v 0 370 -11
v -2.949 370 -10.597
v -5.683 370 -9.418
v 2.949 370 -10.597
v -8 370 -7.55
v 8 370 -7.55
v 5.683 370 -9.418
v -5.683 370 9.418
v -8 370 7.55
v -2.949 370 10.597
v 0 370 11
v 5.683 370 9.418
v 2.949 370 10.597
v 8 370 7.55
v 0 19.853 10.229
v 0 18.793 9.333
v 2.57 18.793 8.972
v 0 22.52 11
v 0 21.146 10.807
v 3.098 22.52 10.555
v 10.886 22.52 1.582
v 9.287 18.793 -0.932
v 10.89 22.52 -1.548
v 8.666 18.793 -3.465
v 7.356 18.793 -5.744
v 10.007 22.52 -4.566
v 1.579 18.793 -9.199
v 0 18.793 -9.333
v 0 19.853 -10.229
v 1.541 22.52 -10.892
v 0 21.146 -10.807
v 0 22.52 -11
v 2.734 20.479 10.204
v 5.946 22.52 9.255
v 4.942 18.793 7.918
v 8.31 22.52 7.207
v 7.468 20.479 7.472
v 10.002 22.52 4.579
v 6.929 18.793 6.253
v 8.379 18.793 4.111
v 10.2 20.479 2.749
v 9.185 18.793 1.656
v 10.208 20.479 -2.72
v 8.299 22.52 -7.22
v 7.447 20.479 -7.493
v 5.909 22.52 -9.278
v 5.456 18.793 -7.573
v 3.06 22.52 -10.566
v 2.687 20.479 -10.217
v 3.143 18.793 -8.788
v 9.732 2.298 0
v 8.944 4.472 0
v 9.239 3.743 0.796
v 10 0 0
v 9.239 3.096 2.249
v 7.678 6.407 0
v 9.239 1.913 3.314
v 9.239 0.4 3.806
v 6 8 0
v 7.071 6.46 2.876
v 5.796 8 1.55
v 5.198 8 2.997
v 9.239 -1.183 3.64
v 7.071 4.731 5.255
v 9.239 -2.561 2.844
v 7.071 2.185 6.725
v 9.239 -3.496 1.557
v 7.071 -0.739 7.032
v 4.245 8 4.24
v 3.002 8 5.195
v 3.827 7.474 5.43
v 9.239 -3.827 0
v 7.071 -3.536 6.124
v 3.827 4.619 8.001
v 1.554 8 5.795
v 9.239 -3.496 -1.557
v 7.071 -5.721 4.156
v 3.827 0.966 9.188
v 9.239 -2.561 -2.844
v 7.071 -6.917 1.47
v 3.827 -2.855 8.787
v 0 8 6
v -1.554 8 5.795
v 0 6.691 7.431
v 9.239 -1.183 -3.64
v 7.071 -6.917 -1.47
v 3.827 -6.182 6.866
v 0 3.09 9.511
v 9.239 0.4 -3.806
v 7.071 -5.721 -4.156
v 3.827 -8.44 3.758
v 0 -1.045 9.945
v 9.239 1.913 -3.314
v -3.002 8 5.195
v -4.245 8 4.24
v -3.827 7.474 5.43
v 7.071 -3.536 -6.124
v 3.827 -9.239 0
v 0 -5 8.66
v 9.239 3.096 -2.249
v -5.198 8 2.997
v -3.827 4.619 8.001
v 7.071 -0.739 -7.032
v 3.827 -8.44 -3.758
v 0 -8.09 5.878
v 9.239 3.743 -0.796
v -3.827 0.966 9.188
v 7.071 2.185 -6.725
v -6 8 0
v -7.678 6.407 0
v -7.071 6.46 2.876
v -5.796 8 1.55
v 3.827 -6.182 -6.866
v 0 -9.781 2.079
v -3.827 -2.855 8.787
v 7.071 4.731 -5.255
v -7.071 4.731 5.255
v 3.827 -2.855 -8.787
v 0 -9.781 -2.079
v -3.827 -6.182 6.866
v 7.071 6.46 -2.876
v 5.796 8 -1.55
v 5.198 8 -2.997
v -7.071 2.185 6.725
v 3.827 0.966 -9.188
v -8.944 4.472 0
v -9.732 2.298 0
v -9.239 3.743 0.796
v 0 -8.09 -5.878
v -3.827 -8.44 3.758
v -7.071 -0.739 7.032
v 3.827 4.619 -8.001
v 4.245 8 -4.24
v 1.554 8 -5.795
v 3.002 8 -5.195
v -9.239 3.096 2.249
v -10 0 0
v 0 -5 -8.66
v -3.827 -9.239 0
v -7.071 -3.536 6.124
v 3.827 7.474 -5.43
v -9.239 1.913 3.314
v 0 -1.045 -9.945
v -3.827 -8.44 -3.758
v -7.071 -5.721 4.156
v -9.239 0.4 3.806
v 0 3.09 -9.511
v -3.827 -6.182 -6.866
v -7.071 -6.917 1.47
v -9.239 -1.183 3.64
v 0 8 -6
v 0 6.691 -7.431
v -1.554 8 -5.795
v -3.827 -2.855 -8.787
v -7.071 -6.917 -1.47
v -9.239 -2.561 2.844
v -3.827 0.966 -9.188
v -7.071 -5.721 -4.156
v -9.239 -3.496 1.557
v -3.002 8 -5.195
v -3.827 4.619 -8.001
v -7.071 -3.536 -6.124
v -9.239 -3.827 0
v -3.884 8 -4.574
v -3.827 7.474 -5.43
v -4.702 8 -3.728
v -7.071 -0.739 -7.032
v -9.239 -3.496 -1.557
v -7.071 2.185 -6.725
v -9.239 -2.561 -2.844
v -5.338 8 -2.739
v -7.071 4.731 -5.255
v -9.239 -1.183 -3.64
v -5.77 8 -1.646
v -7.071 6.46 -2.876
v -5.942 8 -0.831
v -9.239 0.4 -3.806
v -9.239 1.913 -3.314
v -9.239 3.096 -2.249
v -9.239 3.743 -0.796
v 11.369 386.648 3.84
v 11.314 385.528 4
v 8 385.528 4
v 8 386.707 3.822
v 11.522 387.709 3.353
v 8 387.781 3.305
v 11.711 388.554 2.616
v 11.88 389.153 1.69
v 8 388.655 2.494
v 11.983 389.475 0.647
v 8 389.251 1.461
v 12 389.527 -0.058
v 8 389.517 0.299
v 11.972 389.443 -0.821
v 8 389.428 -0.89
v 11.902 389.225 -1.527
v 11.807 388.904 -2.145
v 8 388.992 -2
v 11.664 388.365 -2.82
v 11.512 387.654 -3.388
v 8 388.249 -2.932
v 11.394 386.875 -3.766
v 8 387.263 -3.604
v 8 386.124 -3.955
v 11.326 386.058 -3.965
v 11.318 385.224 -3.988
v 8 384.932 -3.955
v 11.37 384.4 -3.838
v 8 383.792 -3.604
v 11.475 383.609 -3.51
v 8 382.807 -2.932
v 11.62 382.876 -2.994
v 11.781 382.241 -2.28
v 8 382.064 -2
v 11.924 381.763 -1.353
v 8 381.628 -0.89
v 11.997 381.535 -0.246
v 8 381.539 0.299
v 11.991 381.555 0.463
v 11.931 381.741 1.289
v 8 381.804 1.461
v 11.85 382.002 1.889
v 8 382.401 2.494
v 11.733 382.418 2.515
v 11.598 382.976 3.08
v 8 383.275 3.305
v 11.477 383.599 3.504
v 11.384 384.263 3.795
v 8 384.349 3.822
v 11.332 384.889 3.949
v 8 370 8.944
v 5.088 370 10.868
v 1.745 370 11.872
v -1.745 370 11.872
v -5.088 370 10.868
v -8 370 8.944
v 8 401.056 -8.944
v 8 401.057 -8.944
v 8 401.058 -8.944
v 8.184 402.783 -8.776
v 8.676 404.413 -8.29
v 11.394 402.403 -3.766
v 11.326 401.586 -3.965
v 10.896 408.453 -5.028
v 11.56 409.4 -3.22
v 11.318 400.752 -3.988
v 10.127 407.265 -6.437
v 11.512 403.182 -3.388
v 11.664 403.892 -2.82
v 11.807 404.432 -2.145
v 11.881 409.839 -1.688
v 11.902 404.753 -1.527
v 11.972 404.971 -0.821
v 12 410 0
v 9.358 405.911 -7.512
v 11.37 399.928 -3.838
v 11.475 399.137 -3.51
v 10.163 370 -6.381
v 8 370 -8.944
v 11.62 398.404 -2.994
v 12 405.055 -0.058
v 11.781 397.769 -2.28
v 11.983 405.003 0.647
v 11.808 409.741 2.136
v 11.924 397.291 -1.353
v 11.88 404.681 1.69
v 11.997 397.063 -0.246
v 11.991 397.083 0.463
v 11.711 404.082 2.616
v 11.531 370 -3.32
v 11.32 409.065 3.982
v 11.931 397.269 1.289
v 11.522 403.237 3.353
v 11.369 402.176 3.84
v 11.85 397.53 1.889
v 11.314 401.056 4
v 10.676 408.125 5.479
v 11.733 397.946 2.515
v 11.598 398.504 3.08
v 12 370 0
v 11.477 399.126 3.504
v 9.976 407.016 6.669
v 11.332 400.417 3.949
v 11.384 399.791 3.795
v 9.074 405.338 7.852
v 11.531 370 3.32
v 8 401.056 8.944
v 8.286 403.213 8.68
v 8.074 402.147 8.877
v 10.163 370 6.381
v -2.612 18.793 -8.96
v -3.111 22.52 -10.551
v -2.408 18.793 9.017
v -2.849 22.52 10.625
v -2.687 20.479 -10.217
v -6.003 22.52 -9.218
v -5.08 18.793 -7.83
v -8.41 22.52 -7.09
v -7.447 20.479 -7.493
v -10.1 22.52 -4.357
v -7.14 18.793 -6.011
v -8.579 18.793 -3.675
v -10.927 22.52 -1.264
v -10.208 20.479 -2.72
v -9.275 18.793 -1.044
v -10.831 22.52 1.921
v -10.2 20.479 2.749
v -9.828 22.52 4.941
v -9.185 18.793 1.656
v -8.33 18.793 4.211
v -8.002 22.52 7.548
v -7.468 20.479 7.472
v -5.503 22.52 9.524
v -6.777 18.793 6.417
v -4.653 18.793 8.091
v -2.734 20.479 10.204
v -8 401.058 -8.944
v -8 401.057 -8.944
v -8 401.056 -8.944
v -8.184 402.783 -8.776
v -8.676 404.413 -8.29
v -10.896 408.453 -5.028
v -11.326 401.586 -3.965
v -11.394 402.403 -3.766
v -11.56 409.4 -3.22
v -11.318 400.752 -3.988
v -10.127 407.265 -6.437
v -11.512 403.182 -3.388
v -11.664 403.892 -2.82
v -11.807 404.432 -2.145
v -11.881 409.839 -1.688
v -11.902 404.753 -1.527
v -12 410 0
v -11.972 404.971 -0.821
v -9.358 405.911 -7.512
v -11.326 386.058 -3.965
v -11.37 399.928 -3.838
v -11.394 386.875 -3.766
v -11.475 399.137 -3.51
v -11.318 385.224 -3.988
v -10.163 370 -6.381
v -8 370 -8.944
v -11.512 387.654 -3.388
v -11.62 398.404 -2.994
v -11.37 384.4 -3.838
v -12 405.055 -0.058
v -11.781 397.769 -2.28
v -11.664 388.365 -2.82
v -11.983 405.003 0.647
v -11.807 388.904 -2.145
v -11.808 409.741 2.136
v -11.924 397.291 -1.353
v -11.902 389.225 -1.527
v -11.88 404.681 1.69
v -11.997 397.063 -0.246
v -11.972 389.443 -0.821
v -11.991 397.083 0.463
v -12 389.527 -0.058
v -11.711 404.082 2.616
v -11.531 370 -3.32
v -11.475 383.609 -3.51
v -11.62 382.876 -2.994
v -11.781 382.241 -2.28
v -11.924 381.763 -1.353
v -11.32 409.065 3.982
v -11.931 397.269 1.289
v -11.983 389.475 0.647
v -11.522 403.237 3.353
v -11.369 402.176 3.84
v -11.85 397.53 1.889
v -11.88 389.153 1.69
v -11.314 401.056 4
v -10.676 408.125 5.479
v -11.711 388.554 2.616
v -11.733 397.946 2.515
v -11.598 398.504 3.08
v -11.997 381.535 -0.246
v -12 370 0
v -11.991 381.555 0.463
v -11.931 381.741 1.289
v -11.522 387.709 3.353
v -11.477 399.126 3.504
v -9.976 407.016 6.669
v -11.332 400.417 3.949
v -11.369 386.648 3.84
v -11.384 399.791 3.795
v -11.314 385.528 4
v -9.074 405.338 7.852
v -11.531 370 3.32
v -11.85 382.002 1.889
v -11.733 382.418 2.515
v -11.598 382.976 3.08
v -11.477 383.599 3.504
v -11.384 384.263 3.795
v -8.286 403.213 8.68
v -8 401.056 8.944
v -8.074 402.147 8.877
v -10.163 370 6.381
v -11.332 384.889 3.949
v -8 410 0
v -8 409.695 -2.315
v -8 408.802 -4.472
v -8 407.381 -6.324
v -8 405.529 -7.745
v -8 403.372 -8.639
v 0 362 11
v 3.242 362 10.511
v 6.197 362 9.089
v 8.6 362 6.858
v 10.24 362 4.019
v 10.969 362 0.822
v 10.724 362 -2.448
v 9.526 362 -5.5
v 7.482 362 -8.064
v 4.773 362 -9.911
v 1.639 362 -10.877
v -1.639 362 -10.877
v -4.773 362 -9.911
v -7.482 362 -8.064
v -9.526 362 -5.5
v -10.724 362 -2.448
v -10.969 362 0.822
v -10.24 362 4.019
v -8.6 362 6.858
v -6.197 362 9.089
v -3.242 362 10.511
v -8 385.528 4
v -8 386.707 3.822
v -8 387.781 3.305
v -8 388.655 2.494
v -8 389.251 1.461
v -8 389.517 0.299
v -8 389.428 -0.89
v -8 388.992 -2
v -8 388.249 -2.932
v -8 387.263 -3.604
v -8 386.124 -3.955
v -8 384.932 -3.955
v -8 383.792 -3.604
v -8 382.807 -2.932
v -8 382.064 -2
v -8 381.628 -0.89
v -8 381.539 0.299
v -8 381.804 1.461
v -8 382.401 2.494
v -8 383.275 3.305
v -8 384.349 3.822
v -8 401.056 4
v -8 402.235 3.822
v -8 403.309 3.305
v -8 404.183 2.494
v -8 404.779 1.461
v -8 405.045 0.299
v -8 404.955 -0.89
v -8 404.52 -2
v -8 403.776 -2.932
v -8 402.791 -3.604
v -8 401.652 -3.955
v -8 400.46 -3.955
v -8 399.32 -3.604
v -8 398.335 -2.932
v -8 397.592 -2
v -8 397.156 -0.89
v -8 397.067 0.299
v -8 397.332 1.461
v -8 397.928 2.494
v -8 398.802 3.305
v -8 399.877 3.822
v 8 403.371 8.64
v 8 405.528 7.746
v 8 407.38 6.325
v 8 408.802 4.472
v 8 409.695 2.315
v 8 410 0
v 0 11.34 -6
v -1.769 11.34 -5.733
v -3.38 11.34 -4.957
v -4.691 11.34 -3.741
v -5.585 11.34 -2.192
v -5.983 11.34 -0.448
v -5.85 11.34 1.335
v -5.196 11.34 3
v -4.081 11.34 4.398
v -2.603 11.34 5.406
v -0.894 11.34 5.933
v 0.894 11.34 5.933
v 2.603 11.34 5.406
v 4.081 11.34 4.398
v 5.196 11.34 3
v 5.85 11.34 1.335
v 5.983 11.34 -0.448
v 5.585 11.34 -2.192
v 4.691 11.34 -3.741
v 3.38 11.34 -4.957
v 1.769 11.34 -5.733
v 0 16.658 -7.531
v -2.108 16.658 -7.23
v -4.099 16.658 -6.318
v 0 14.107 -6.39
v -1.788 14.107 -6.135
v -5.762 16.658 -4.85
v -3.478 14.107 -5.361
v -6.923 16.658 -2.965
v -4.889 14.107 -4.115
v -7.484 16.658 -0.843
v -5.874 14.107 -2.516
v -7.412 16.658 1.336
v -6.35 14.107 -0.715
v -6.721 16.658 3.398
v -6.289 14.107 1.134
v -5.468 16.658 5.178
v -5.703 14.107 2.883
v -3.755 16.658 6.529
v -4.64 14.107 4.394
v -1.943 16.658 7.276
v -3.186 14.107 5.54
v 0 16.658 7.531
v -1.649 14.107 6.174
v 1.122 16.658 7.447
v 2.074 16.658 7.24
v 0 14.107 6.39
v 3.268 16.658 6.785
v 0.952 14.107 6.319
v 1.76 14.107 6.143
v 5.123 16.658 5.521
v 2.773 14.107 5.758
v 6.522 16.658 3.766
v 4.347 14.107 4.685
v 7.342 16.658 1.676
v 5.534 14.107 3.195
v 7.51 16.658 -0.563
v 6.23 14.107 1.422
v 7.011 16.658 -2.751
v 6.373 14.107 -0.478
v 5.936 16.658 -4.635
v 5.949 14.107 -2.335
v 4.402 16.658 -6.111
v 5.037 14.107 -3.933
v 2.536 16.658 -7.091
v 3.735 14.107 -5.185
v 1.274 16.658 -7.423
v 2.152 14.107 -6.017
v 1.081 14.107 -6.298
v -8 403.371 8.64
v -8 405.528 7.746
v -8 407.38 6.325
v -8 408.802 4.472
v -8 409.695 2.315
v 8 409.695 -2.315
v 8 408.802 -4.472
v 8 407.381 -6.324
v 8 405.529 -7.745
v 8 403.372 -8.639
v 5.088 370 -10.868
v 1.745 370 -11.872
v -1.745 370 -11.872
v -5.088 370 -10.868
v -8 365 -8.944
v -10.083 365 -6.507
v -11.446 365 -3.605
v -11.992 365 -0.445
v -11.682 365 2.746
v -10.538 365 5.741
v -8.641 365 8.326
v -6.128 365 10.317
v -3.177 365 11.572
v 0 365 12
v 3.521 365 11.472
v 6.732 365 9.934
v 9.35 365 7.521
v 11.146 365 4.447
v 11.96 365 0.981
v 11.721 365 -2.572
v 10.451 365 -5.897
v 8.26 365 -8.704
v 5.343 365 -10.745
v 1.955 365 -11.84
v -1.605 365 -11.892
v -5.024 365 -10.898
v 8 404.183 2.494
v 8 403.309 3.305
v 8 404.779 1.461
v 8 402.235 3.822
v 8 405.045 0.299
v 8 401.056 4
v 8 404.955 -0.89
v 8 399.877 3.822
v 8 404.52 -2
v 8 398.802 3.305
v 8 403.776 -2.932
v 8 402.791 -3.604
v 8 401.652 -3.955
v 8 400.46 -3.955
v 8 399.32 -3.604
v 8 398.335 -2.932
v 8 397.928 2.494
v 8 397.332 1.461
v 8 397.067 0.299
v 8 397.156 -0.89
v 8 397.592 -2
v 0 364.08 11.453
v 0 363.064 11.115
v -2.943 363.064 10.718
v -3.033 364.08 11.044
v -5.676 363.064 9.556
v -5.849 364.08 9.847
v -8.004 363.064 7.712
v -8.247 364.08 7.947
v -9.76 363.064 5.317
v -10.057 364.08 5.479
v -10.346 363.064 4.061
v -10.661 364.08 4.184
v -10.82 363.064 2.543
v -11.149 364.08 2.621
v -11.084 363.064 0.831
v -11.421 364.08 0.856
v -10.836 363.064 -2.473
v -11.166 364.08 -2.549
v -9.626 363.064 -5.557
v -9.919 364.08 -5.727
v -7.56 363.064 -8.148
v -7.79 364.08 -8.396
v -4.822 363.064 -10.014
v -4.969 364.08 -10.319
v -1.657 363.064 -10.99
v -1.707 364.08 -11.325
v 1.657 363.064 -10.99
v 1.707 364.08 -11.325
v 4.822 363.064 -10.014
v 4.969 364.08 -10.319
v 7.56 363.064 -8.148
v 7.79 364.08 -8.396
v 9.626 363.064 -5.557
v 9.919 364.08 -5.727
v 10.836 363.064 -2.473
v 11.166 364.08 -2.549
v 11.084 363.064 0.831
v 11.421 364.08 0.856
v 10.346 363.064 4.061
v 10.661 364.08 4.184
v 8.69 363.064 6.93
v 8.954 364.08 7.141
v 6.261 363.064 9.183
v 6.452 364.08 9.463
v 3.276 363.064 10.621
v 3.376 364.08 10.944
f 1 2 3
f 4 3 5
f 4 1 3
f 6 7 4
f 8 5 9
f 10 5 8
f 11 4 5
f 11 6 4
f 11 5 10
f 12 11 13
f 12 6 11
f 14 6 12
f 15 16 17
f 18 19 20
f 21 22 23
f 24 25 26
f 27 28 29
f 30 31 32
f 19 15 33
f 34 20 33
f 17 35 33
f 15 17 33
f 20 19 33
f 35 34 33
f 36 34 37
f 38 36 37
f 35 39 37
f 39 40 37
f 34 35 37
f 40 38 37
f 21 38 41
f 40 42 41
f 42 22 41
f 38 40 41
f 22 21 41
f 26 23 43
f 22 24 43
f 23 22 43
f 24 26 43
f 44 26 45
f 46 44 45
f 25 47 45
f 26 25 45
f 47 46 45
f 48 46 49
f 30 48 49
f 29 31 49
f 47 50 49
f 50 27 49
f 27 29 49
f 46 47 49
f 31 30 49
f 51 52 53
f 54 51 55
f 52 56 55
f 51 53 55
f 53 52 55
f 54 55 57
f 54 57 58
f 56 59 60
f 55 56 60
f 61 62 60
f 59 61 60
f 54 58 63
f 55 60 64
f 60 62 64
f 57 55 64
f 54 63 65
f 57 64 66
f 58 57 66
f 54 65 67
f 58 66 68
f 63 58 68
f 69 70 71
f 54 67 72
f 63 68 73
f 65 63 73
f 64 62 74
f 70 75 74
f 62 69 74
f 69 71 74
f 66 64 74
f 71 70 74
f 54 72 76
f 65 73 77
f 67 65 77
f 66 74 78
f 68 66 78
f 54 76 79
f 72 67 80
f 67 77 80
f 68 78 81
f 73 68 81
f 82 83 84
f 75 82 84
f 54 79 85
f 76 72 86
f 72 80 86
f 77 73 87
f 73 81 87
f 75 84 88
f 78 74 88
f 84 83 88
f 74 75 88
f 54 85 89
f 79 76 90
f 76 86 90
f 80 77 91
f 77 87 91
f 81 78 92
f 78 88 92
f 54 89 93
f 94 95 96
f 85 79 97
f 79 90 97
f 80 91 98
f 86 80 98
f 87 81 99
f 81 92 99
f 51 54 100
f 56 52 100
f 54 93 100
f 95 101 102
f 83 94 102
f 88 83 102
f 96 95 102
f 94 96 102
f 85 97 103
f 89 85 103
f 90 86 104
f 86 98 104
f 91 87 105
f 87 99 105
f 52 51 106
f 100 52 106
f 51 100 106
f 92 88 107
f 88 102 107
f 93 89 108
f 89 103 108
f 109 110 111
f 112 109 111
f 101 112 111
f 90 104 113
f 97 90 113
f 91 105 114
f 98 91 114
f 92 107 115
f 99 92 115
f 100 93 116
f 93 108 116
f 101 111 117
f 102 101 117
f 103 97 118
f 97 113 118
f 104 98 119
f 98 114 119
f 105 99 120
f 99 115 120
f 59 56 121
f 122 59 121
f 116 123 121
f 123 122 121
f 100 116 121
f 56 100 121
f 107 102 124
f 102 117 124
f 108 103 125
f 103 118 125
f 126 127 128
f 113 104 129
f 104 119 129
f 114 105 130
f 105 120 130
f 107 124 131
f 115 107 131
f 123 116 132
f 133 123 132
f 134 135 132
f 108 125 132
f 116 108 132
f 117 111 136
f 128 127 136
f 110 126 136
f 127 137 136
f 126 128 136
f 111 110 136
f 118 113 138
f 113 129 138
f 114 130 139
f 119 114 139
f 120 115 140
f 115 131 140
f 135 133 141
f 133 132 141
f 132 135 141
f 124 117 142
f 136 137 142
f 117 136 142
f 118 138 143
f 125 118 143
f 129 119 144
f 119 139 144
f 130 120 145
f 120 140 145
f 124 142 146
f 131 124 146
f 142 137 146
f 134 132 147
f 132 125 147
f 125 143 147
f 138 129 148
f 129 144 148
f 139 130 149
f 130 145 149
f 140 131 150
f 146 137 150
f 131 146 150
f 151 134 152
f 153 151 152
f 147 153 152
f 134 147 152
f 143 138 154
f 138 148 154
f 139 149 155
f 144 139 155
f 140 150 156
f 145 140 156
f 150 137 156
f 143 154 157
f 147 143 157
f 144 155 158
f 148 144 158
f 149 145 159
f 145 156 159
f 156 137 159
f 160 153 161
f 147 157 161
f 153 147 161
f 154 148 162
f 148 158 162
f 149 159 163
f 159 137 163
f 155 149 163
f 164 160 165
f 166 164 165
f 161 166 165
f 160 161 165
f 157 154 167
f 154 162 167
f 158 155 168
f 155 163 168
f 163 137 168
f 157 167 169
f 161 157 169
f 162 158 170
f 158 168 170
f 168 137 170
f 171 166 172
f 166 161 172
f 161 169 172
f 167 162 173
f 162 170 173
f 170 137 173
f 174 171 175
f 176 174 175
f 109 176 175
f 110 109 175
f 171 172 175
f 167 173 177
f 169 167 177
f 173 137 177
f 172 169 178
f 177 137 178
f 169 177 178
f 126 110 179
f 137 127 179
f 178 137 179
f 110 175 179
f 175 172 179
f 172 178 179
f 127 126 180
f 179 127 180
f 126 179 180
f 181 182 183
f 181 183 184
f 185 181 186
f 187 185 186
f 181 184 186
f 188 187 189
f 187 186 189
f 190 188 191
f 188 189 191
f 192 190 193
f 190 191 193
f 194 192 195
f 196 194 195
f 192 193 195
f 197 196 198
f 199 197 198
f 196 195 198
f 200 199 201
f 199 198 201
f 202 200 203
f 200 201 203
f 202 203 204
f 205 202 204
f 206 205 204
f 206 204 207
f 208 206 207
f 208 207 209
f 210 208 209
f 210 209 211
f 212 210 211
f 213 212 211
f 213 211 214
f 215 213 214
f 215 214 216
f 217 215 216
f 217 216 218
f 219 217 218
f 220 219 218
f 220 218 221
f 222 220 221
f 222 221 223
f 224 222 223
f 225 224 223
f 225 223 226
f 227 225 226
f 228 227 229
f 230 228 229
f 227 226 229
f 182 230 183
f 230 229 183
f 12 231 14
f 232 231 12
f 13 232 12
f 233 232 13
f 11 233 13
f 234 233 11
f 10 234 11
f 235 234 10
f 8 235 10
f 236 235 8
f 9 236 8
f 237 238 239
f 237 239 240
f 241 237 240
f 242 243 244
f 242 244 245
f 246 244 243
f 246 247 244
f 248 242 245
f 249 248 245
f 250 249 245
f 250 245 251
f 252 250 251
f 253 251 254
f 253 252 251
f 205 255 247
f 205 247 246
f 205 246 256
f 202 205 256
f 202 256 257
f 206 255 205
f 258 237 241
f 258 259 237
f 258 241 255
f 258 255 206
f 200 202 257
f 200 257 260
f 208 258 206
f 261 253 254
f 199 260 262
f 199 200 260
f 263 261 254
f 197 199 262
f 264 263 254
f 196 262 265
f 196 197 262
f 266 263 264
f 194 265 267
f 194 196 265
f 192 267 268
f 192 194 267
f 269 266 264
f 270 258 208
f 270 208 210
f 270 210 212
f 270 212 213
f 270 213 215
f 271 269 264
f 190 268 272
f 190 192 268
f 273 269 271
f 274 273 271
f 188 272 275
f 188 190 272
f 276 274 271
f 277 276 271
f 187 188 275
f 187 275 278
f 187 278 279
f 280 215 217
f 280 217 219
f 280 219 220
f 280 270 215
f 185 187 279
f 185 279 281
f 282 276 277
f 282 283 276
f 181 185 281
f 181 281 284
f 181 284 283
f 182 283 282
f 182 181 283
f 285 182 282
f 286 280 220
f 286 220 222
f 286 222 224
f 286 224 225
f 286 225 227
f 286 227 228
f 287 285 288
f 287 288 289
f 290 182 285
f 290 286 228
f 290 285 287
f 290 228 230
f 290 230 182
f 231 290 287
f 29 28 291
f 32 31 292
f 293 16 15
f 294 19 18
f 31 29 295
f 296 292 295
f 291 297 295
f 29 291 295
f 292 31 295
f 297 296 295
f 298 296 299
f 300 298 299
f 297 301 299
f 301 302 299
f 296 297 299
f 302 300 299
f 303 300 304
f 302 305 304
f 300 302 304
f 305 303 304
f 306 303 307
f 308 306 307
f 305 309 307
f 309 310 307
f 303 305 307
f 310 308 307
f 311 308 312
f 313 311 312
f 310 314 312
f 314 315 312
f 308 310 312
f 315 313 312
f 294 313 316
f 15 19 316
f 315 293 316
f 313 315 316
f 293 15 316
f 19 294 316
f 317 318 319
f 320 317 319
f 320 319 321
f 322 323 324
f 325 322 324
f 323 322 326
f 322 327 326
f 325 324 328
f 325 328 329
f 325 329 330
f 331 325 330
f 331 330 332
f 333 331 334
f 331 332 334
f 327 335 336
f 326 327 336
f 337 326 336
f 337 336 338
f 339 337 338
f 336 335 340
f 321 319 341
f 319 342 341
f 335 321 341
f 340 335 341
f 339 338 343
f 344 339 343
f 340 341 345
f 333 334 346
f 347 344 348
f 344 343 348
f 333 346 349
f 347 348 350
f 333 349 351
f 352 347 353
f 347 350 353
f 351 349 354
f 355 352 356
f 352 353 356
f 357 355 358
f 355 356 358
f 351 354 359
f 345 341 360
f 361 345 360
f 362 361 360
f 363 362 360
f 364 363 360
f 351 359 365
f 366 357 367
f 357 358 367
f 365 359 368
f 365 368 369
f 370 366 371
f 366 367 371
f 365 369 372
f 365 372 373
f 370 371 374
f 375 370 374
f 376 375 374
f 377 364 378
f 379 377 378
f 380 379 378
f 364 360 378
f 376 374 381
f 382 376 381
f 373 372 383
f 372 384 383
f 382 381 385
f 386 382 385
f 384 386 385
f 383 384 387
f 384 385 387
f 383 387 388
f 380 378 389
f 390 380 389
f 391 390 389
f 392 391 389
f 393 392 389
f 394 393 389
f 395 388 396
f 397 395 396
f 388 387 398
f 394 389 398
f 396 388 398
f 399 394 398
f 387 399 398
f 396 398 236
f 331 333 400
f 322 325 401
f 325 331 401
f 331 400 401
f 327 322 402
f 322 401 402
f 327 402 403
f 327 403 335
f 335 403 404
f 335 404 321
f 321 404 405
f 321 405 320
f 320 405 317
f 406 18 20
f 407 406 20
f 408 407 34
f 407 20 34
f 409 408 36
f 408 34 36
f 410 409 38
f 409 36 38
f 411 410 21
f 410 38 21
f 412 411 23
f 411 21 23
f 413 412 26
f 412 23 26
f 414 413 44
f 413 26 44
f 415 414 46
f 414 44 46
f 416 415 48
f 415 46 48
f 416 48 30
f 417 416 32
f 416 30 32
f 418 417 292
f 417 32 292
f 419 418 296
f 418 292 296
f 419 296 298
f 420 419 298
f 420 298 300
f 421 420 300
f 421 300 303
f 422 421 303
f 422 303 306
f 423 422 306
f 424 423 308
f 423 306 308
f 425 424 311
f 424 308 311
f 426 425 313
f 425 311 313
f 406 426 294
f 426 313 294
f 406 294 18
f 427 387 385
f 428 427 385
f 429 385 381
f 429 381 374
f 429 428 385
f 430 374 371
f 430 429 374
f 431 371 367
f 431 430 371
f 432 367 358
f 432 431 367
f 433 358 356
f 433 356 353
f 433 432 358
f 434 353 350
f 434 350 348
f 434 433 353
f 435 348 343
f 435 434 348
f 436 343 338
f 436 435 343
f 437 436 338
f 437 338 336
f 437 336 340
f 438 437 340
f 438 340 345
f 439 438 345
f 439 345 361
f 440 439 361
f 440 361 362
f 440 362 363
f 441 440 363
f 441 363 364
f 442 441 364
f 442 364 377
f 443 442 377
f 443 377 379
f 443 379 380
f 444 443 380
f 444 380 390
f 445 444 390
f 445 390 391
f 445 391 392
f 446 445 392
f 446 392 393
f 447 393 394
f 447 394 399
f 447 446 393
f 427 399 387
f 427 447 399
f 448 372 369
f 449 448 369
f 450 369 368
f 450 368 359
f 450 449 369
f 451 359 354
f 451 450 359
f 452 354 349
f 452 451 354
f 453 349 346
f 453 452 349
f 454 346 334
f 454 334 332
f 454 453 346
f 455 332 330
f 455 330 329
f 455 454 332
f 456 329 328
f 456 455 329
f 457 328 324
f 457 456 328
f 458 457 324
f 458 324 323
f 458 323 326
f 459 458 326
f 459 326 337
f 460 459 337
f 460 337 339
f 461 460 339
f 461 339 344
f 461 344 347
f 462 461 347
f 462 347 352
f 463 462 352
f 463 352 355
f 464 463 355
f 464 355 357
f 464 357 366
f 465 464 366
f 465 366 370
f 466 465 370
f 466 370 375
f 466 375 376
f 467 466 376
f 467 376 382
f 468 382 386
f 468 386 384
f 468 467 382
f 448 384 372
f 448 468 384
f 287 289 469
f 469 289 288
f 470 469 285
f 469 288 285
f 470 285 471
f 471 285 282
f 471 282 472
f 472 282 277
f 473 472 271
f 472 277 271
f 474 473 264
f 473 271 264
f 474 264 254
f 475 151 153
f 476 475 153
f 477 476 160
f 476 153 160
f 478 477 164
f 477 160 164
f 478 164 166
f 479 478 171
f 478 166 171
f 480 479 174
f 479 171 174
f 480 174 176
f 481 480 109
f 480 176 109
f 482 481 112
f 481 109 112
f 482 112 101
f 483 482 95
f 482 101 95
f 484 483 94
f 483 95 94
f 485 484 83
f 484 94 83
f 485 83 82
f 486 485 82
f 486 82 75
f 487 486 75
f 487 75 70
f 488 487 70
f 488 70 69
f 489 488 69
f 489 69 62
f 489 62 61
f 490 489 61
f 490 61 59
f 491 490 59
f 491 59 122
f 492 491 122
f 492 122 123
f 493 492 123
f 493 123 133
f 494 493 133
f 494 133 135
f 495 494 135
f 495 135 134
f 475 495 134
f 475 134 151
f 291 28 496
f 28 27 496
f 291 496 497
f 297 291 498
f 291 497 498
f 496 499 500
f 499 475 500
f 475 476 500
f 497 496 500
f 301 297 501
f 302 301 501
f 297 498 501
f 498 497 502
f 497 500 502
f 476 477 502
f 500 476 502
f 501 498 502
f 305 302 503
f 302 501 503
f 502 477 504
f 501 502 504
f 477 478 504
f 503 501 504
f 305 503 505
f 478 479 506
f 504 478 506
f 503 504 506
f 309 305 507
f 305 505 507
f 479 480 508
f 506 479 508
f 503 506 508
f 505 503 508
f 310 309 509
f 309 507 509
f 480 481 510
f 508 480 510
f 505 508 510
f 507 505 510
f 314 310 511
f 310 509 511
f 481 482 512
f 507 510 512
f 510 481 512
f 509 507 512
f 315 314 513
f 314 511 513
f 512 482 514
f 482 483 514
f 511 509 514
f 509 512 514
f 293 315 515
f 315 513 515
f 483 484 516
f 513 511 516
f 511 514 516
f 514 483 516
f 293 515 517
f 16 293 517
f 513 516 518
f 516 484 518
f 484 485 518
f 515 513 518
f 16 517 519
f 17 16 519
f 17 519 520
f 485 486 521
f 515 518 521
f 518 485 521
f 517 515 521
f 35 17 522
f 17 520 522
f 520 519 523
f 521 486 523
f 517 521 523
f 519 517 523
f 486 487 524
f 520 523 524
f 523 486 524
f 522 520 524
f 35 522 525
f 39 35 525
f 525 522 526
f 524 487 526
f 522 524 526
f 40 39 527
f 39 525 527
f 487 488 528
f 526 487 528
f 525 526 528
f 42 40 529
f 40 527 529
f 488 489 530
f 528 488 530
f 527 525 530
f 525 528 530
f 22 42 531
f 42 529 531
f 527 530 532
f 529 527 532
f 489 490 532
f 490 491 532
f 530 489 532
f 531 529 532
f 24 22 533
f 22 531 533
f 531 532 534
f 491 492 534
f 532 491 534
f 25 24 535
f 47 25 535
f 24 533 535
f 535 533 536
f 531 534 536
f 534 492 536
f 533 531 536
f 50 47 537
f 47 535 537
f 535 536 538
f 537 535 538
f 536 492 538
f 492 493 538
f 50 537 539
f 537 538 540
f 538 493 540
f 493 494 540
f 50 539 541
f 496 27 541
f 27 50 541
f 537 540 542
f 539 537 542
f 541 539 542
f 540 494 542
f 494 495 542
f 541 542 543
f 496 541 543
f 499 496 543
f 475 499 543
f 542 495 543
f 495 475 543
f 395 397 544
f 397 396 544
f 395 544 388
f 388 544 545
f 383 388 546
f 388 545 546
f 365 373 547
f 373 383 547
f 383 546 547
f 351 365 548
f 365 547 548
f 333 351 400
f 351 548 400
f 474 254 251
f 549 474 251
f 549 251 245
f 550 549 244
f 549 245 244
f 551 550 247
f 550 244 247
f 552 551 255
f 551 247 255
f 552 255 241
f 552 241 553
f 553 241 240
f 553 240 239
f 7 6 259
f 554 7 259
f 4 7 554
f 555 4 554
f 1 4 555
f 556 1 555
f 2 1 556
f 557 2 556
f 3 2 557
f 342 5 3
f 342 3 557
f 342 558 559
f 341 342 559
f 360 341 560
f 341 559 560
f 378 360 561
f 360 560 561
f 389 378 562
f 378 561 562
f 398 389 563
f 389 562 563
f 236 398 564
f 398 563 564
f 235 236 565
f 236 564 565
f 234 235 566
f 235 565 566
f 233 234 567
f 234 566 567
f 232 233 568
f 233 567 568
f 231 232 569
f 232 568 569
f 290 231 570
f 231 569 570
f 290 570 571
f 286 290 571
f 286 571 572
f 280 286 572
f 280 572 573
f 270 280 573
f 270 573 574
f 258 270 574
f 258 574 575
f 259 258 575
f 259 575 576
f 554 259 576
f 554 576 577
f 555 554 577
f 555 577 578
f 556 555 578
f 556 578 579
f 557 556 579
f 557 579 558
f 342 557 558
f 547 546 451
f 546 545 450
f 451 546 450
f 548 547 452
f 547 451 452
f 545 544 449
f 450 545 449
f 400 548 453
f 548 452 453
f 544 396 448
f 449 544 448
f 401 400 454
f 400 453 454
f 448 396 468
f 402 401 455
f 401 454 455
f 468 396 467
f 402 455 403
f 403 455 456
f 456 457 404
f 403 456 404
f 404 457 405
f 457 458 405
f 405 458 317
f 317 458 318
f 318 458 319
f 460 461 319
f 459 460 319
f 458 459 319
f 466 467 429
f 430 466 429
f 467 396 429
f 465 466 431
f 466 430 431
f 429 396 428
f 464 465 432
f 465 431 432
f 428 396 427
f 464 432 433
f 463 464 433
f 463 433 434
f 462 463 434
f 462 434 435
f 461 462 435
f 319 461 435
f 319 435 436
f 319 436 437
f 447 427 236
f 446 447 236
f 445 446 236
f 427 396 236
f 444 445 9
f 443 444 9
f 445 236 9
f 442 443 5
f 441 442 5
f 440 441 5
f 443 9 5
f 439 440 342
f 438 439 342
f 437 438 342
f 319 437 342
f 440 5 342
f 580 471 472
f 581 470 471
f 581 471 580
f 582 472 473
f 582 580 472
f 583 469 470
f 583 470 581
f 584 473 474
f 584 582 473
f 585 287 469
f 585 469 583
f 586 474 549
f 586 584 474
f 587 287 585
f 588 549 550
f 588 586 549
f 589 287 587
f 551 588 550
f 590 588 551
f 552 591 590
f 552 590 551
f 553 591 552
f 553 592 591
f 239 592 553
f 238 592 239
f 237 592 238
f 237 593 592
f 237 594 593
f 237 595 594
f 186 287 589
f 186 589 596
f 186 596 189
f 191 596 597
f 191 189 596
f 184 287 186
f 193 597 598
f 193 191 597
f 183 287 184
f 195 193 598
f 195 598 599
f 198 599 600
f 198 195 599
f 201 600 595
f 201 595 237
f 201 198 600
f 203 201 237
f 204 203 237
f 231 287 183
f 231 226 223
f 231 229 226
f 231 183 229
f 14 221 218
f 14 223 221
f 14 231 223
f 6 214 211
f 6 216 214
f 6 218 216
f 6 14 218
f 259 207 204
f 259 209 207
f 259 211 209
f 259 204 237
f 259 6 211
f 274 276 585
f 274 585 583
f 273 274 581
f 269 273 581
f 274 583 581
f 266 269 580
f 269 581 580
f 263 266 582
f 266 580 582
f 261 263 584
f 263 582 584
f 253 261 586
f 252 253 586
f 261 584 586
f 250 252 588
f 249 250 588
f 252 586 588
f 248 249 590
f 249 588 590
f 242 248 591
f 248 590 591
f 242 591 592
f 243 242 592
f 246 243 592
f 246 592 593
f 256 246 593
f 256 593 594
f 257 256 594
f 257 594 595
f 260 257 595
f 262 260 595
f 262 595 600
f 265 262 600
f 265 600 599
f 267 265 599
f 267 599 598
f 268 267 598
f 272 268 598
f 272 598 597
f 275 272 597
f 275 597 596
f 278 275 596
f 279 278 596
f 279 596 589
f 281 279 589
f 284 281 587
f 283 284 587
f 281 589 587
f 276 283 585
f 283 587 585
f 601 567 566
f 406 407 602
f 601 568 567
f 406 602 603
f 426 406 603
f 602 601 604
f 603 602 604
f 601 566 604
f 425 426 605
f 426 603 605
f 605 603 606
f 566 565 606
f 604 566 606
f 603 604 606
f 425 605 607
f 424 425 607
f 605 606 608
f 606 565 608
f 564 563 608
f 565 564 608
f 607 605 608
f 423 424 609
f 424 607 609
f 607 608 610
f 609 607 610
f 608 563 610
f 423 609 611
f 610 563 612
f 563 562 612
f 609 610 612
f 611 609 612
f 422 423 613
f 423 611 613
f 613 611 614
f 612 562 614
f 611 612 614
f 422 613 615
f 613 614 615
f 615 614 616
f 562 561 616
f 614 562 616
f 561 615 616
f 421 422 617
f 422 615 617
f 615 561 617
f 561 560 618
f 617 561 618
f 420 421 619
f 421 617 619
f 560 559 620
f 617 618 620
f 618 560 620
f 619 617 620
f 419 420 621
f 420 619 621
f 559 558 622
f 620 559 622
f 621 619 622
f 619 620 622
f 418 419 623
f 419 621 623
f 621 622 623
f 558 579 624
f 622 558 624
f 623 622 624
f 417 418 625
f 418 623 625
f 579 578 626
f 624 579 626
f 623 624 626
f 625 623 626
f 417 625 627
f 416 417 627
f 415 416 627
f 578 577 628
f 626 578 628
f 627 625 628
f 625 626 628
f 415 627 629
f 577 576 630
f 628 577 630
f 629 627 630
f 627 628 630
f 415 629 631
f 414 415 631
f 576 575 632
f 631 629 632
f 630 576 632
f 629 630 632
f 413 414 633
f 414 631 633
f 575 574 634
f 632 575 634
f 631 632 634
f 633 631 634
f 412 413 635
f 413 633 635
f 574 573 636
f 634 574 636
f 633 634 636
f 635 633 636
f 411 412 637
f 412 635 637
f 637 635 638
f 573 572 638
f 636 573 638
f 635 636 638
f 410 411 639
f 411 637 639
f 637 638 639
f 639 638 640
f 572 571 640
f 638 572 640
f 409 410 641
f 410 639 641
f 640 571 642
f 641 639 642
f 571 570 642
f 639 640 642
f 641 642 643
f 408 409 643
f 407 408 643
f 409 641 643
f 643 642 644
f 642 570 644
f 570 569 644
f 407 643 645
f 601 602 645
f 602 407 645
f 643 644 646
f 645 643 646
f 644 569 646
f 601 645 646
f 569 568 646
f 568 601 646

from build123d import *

# Parameters (mm, degrees)
ESBO_O2_R                         = 6
RESSALTO_EXTRUS_O1_DEPTH          = 20
ESBO_O3_R                         = 11
RESSALTO_EXTRUS_O2_DEPTH          = 350
FILETE1_R                         = 10
FILETE2_R                         = 5
RESSALTO_EXTRUS_O3_DEPTH          = 40
RESSALTO_EXTRUS_O4_START          = -5
ESBO_O7_R                         = 12
RESSALTO_EXTRUS_O4_DEPTH          = 5
FILETE3_R                         = 5
CORTE_EXTRUS_O1_DEPTH             = 17.5
CORTE_EXTRUS_O2_REACH             = 412.663
ESBO_O10_R                        = 4
CORTE_EXTRUS_O2_DIRECTION_2_REACH = 412.663


with BuildPart() as part:
    # Esboço1 → Revolução1 (revolve)
    with BuildSketch(Plane.XY):
        with BuildLine():
            Line((-10, 0), (10, 0))
            ThreePointArc((10, 0), (0, 10), (-10, 0))
        make_face()
    revolve(axis=Axis((-10, 0, 0), (1, 0, 0)))

    # Esboço2 → Ressalto-extrusão1 (add)
    with BuildSketch(Plane(origin=(0, 0, 0), x_dir=(1, 0, 0), z_dir=(0, 1, 0))):
        with Locations(Location((0, 0, 0), (0, 0, 90))):
            Circle(ESBO_O2_R)
    extrude(amount=RESSALTO_EXTRUS_O1_DEPTH)

    # Esboço3 → Ressalto-extrusão2 (add)
    with BuildSketch(Plane(origin=(0, 20, 0), x_dir=(1, 0, 0), z_dir=(0, 1, 0))):
        with Locations(Location((0, 0, 0), (0, 0, 270))):
            Circle(ESBO_O3_R)
    extrude(amount=RESSALTO_EXTRUS_O2_DEPTH)

    # Filete1
    # the kernel refuses this fillet: 10 mm, written as the material it adds along each edge
    with BuildSketch(Plane(origin=(0, 20, 0), x_dir=(0, 0, -1), z_dir=(1, 0, 0))) as filete1_piece_1:
        with BuildLine():
            CenterArc((16, -8.660254038), FILETE1_R, 120, 60)
            Line((6, -8.660254038), (5.8, -8.660254038))
            Line((5.8, -8.660254038), (5.8, 0))
            Line((5.8, 0), (6, 0.2))
            ThreePointArc((6, 0.2), (8.5, 0.2), (10.9, 0.173205081))
            Line((10.9, 0.173205081), (11, 0))
        make_face()
    revolve(axis=Axis((0, 20, 0), (0, 1, 0)))

    # Filete2
    filete2_edges = [part.edges().sort_by_distance(p)[0] for p in [
        (11, 20, 0),
    ]]
    fillet(filete2_edges, radius=FILETE2_R)

    # Esboço5 → Ressalto-extrusão3 (add)
    with BuildSketch(Plane(origin=(0, 370, 0), x_dir=(1, 0, 0), z_dir=(0, 1, 0))):
        with BuildLine():
            Line((-8, -8.94427191), (-8, 8.94427191))
            ThreePointArc((-8, 8.94427191), (-12, 0), (-8, -8.94427191))
        make_face()
        with BuildLine():
            Line((8, -8.94427191), (8, 8.94427191))
            ThreePointArc((8, 8.94427191), (12, 0), (8, -8.94427191))
        make_face()
    extrude(amount=RESSALTO_EXTRUS_O3_DEPTH)

    # Esboço7 → Ressalto-extrusão4 (add)
    with BuildSketch(Plane(origin=(0, 370, 0), x_dir=(1, 0, 0), z_dir=(0, 1, 0)).offset(RESSALTO_EXTRUS_O4_START)):
        with Locations(Location((0, 0, 0), (0, 0, 131.810314896))):
            Circle(ESBO_O7_R)
    extrude(amount=RESSALTO_EXTRUS_O4_DEPTH)

    # Filete3
    # the kernel refuses this fillet: 5 mm, written as the material it adds along each edge
    with BuildSketch(Plane(origin=(0, 365, 0), x_dir=(0, 0, 1), z_dir=(1, 0, 0))) as filete3_piece_1:
        with BuildLine():
            CenterArc((16, 3), FILETE3_R, 180, 36.869897646)
            Line((12, 0), (11.92, -0.06))
            ThreePointArc((11.92, -0.06), (11.5, -0.1), (11, -0.1))
            Line((11, -0.1), (10.9, 0))
            Line((10.9, 0), (10.9, 3))
            Line((10.9, 3), (11, 3))
        make_face()
    revolve(axis=Axis((0, 365, 0), (0, -1, 0)))

    # Esboço9 → Corte-extrusão1 (cut, symmetric)
    with BuildSketch(Plane(origin=(0, 0, 0), x_dir=(0, 0, -1), z_dir=(1, 0, 0))):
        with BuildLine():
            Line((-8.94427191, 410), (-8.94427191, 401.05572809))
            ThreePointArc((-8.94427191, 401.05572809), (-6.32455539, 407.38028334), (-1.98e-07, 410))
            Line((-1.98e-07, 410), (-8.94427191, 410))
        make_face()
        with BuildLine():
            Line((8.94427191, 410), (-1.98e-07, 410))
            ThreePointArc((-1.98e-07, 410), (6.32455525, 407.38028348), (8.94427191, 401.05572809))
            Line((8.94427191, 401.05572809), (8.94427191, 410))
        make_face()
    extrude(amount=CORTE_EXTRUS_O1_DEPTH, both=True, mode=Mode.SUBTRACT)

    # Esboço10 → Corte-extrusão2 (cut, up to next)
    with BuildSketch(Plane.ZY.offset(-8), mode=Mode.PRIVATE) as corte_extrus_o2_sk1:
        with Locations((0, 385.527864045)):
            Circle(ESBO_O10_R)
    corte_extrus_o2_tool1 = extrude(corte_extrus_o2_sk1.sketch, amount=-CORTE_EXTRUS_O2_REACH, mode=Mode.PRIVATE) & part.part
    # Esboço10 → Corte-extrusão2 (cut, up to next)
    with BuildSketch(Plane.ZY.offset(-8), mode=Mode.PRIVATE) as corte_extrus_o2_sk2:
        with Locations((0, 401.05572809)):
            Circle(ESBO_O10_R)
    corte_extrus_o2_tool2 = extrude(corte_extrus_o2_sk2.sketch, amount=-CORTE_EXTRUS_O2_REACH, mode=Mode.PRIVATE) & part.part
    add(corte_extrus_o2_tool1.solids().sort_by_distance((8, 385.527864, 0))[0], mode=Mode.SUBTRACT)
    add(corte_extrus_o2_tool2.solids().sort_by_distance((8, 401.055728, 0))[0], mode=Mode.SUBTRACT)

    # Esboço10 → Corte-extrusão2 direction 2 (cut, up to next)
    with BuildSketch(Plane.ZY.offset(-8), mode=Mode.PRIVATE) as corte_extrus_o2_direction_2_sk1:
        with Locations((0, 385.527864045)):
            Circle(ESBO_O10_R)
    corte_extrus_o2_direction_2_tool1 = extrude(corte_extrus_o2_direction_2_sk1.sketch, amount=CORTE_EXTRUS_O2_DIRECTION_2_REACH, mode=Mode.PRIVATE) & part.part
    # Esboço10 → Corte-extrusão2 direction 2 (cut, up to next)
    with BuildSketch(Plane.ZY.offset(-8), mode=Mode.PRIVATE) as corte_extrus_o2_direction_2_sk2:
        with Locations((0, 401.05572809)):
            Circle(ESBO_O10_R)
    corte_extrus_o2_direction_2_tool2 = extrude(corte_extrus_o2_direction_2_sk2.sketch, amount=CORTE_EXTRUS_O2_DIRECTION_2_REACH, mode=Mode.PRIVATE) & part.part
    add(corte_extrus_o2_direction_2_tool1.solids().sort_by_distance((8, 385.527864, 0))[0], mode=Mode.SUBTRACT)
    add(corte_extrus_o2_direction_2_tool2.solids().sort_by_distance((8, 401.055728, 0))[0], mode=Mode.SUBTRACT)


solid = part.part
